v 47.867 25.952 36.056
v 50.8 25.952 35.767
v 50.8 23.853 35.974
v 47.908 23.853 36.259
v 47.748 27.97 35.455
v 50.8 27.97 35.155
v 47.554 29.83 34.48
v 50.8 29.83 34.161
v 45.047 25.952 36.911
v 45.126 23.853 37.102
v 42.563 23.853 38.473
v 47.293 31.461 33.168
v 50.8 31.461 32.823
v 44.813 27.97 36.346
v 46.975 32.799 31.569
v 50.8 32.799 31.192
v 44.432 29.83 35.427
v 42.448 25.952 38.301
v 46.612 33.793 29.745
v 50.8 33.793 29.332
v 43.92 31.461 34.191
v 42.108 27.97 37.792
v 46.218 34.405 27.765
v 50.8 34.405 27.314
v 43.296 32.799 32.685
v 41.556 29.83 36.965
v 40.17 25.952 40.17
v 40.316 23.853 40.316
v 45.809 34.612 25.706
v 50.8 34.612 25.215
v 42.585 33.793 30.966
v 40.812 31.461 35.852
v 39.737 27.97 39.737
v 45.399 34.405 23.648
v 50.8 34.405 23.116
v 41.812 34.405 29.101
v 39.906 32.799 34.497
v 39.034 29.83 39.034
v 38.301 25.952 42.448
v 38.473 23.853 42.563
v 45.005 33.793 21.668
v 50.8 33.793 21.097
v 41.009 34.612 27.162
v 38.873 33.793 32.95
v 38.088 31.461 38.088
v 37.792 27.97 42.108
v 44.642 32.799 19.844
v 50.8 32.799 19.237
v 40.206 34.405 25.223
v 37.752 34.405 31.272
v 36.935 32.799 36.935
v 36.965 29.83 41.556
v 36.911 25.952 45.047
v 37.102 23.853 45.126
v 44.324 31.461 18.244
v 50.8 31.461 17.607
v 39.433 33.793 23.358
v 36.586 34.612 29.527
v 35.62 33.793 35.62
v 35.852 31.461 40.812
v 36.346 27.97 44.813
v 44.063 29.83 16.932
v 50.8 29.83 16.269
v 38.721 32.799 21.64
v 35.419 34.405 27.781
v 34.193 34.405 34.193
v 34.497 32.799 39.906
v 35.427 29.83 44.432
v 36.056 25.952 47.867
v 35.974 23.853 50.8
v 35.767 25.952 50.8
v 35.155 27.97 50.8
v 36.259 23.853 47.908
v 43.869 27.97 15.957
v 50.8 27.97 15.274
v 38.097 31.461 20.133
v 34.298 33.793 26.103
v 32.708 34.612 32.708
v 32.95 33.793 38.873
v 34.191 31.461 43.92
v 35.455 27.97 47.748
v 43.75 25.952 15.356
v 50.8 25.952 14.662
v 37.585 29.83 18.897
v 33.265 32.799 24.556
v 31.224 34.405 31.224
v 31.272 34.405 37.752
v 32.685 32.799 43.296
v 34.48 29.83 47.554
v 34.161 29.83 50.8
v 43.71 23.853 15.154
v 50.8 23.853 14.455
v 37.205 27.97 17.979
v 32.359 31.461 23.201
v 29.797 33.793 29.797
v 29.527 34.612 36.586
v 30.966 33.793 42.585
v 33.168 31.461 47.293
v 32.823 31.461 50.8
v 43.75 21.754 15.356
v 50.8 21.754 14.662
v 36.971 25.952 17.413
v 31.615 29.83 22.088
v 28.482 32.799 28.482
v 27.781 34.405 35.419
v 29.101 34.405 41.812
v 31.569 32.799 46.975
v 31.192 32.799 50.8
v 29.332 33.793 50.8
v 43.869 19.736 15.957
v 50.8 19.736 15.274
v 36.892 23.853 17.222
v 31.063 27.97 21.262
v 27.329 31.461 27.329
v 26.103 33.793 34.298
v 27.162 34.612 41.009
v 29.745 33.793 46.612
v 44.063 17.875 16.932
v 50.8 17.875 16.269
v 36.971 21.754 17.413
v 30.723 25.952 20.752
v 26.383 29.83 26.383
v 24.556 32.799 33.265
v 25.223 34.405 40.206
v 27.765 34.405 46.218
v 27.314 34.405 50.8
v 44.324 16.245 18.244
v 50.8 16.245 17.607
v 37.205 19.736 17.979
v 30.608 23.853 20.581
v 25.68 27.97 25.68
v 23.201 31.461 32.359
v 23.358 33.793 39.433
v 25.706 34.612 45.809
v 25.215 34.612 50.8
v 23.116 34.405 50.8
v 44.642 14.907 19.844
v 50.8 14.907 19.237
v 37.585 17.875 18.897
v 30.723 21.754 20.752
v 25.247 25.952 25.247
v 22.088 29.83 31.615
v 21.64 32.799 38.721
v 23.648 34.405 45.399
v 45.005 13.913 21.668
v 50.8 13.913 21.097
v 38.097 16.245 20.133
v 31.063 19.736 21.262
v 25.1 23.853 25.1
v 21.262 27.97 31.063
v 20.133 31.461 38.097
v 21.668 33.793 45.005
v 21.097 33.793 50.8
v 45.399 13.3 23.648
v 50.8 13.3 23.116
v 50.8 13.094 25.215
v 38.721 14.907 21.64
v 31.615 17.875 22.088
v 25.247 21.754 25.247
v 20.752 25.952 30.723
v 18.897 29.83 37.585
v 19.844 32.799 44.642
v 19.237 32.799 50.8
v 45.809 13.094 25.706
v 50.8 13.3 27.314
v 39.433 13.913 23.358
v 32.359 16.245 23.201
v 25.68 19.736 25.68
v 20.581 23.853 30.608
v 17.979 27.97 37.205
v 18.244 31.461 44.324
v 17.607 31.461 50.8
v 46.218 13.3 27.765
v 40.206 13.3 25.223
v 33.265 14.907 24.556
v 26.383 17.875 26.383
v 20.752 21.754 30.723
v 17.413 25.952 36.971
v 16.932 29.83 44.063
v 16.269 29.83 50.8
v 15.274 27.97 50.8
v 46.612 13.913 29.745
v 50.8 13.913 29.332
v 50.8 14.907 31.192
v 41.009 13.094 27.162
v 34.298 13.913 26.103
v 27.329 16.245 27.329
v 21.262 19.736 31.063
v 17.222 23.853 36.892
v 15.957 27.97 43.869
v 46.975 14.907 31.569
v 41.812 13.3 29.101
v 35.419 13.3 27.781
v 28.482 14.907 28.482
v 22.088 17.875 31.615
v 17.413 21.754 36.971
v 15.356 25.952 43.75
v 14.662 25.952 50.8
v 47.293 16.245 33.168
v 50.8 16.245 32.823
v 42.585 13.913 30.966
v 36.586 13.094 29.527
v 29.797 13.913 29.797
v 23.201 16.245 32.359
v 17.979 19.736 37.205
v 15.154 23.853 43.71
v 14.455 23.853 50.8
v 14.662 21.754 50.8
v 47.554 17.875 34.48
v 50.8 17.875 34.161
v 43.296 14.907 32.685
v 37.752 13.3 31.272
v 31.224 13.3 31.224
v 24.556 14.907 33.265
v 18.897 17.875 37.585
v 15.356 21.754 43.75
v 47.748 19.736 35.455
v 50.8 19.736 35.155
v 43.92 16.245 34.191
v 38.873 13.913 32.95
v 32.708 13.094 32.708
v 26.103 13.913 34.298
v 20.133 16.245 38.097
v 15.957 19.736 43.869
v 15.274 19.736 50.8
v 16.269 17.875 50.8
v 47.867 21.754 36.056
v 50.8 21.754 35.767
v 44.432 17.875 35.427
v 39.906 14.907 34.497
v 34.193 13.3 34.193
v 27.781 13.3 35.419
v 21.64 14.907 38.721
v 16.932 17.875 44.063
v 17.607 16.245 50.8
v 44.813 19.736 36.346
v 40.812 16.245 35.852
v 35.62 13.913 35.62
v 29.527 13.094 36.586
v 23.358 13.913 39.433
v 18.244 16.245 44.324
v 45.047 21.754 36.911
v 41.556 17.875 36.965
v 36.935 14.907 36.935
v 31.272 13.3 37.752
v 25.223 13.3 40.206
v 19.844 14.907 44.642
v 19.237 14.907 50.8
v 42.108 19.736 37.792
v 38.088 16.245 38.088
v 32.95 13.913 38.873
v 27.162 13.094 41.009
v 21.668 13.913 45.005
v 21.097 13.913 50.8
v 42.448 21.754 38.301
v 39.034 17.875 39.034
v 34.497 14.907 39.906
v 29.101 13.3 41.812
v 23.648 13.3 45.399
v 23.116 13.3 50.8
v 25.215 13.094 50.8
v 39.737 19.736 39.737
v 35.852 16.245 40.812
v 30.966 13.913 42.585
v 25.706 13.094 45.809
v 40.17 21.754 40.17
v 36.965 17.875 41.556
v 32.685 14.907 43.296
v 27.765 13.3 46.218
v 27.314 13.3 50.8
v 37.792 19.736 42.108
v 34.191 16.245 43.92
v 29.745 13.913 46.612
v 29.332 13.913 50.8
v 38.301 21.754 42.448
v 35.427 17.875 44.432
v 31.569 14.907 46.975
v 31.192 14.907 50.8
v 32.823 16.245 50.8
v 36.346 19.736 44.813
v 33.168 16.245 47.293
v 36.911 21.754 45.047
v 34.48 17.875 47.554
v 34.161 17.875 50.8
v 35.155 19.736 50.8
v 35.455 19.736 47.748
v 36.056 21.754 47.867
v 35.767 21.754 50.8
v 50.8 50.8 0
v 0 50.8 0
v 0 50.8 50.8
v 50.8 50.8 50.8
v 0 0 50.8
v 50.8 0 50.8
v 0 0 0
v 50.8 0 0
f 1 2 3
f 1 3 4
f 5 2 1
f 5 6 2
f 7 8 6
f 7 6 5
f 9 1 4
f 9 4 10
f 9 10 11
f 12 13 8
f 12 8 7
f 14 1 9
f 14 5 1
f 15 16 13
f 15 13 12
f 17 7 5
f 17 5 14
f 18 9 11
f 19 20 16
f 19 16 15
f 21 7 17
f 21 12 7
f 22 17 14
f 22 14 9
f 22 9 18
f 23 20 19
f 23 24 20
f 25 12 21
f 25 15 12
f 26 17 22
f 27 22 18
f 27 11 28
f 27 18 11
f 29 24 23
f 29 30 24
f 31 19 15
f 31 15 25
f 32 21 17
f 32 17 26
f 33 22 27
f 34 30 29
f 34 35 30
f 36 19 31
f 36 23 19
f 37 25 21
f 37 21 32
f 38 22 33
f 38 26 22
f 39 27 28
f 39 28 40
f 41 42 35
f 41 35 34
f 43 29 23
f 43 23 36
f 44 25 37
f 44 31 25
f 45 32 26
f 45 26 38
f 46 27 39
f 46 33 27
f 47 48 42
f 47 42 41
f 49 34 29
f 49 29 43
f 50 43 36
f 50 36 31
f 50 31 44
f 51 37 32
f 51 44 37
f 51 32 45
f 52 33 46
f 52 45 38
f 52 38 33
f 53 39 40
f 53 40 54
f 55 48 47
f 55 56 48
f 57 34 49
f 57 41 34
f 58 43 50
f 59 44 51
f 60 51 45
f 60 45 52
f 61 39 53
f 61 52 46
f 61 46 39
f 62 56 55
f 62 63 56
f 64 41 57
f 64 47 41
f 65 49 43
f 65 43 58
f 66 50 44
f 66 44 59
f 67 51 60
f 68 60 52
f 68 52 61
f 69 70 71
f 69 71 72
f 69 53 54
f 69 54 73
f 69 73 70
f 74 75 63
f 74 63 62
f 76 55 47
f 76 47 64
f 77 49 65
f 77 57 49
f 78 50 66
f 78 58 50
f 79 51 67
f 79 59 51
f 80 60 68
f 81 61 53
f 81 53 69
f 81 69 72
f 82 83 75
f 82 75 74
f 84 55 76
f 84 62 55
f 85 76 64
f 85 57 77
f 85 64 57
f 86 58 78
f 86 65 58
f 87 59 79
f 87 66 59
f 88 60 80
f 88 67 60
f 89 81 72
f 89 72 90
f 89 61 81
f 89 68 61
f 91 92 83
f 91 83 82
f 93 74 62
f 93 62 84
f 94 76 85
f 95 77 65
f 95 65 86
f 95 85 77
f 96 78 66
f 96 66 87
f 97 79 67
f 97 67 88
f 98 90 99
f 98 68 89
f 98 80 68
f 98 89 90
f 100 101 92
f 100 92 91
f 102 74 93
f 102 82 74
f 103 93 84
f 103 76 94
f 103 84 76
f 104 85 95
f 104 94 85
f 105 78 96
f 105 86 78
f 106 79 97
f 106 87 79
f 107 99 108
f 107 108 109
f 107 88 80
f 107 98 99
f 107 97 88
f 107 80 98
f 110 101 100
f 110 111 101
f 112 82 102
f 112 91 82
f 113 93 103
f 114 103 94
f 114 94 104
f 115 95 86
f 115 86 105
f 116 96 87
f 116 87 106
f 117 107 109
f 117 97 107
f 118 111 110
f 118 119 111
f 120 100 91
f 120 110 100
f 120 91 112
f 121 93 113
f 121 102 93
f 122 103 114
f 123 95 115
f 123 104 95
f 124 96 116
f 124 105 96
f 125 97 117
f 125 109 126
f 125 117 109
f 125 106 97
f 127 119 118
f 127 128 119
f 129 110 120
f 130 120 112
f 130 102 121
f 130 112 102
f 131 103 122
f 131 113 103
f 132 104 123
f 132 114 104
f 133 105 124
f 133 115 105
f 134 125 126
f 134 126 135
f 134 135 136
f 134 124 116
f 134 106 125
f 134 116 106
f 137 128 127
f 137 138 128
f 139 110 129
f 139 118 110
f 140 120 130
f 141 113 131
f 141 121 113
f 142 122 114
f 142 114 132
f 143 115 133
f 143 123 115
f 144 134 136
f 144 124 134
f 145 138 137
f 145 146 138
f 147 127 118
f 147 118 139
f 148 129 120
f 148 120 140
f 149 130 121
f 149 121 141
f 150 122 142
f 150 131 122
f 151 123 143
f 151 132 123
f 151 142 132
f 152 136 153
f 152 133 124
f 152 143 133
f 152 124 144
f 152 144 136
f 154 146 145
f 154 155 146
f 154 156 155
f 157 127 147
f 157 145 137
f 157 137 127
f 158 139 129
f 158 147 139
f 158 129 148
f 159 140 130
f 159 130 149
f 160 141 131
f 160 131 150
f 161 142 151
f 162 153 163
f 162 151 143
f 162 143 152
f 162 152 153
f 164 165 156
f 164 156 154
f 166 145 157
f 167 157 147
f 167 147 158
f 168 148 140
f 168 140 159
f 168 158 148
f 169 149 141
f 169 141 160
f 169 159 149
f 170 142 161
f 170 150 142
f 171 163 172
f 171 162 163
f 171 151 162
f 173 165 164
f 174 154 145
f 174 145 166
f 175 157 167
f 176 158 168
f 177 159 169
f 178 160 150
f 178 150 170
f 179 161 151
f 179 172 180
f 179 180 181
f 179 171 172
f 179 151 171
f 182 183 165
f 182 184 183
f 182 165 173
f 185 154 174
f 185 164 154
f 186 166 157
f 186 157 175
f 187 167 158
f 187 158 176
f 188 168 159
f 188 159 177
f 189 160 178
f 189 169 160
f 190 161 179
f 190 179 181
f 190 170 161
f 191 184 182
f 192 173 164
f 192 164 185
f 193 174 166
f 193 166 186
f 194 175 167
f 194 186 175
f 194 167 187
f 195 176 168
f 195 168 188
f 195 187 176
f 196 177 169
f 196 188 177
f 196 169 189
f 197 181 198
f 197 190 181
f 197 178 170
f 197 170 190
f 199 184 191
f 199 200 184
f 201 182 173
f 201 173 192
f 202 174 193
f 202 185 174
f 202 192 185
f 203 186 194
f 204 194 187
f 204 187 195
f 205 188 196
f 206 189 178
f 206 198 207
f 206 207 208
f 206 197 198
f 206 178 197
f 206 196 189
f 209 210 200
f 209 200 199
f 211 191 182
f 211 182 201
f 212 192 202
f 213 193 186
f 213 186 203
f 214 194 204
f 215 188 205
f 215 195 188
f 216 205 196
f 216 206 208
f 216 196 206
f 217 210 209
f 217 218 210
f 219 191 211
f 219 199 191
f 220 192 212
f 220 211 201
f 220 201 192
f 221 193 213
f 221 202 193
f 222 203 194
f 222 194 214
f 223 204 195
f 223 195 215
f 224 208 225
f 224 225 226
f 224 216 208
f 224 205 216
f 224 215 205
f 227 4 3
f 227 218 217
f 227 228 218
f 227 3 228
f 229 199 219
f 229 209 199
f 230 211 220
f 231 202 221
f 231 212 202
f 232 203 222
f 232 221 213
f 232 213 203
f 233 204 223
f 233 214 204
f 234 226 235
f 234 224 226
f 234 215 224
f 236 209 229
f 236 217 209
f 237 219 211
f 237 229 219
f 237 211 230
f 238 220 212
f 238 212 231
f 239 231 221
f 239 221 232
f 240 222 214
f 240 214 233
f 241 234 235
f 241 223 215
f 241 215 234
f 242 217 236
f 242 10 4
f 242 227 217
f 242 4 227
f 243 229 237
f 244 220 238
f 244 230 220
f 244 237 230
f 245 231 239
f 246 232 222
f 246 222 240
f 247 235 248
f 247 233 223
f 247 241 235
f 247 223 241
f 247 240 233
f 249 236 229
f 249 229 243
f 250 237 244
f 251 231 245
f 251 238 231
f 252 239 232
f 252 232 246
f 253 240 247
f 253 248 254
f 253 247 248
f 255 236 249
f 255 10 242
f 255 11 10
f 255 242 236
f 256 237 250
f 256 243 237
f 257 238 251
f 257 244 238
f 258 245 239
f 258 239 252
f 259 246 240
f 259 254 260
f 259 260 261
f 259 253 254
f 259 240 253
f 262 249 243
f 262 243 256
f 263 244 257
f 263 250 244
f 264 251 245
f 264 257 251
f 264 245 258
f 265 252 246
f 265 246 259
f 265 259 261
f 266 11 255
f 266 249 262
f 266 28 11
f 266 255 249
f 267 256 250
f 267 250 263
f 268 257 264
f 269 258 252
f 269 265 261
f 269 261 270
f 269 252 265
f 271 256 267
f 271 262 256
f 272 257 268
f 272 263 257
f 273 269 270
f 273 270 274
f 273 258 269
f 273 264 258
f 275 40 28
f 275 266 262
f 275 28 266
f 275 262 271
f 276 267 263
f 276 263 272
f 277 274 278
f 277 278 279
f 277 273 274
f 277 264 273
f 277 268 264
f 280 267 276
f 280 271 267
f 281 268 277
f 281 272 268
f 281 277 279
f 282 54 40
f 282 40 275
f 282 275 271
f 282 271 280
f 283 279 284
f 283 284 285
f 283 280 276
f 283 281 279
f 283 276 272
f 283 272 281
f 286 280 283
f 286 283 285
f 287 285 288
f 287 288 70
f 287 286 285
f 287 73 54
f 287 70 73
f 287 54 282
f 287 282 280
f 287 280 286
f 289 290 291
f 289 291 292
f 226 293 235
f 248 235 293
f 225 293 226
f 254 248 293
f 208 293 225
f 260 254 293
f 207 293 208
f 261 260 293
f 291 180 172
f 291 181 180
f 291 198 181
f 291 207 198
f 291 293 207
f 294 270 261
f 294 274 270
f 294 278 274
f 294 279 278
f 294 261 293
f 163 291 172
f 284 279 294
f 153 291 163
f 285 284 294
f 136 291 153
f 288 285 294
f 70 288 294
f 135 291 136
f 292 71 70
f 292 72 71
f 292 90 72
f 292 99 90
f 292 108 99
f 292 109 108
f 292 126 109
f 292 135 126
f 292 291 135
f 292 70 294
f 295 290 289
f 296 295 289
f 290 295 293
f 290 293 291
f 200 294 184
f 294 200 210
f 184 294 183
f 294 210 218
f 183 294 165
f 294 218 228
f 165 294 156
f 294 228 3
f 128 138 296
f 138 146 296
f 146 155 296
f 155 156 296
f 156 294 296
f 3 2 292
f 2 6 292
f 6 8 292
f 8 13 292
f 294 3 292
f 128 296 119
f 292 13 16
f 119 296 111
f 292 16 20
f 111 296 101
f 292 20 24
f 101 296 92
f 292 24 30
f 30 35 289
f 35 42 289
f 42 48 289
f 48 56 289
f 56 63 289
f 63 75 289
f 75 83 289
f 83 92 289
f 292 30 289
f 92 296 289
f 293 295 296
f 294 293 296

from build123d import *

# Parameters (mm, degrees)
F0_W     = 50.8
F0_H     = 50.8
F1_DEPTH = 50.8
F2_R     = 10.759246


with BuildPart() as f1:
    # F0 (on Top) → F1 (new body)
    with BuildSketch(Plane.XY):
        with Locations((25.4, 25.4)):
            Rectangle(F0_W, F0_H)
    extrude(amount=F1_DEPTH)

    # F2 (on face) → F3 (revolve, cut)
    with BuildSketch(Plane.XY.offset(50.8)):
        with Locations((25.214618, 23.852944)):
            Circle(F2_R)
    revolve(axis=Axis((50.8, 25.4, 50.8), (0, 1, 0)), mode=Mode.SUBTRACT)


solid = f1.part
